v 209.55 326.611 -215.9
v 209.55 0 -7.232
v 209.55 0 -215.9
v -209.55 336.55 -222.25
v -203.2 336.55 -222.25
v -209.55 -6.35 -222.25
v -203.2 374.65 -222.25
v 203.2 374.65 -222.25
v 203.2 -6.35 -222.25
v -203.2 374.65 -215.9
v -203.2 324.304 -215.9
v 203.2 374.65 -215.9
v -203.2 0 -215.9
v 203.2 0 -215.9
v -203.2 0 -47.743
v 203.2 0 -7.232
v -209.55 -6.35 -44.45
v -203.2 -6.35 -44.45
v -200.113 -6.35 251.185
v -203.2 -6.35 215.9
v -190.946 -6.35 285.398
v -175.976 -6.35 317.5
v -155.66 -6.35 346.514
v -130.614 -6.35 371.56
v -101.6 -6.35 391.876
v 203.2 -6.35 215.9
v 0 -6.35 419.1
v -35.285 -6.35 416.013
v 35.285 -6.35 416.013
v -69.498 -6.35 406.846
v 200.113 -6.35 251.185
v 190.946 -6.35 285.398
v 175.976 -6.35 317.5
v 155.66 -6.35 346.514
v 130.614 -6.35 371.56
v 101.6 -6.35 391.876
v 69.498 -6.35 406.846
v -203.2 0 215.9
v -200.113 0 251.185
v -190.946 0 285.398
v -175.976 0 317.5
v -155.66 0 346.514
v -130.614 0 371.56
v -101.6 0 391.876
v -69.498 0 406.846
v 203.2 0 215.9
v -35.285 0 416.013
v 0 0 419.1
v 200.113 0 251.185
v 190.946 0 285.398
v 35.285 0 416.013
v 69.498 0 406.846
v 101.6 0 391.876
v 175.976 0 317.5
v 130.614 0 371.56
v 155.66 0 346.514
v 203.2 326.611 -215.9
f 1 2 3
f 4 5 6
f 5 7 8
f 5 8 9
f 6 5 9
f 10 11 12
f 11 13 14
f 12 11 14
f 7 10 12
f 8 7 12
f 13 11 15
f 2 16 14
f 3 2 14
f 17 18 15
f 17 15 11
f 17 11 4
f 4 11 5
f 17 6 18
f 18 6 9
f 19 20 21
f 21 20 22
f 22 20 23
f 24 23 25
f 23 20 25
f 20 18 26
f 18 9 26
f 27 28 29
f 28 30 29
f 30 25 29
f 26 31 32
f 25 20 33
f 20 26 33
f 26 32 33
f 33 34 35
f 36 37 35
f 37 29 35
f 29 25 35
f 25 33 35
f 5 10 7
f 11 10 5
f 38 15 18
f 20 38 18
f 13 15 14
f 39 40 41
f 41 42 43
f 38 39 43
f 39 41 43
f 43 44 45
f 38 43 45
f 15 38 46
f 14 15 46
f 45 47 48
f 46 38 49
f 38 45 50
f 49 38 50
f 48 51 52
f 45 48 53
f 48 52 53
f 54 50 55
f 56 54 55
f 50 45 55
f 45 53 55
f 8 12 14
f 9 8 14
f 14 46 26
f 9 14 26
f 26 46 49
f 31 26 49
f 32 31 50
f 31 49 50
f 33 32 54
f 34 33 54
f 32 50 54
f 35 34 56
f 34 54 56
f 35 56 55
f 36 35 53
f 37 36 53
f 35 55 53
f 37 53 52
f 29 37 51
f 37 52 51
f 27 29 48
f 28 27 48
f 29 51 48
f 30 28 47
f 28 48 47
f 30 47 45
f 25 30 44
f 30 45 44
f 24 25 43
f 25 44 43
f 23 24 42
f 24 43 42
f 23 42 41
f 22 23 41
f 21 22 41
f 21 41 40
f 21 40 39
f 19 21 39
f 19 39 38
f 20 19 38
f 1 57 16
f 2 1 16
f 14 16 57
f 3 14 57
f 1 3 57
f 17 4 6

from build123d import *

# Parameters (mm, degrees)
F1_DEPTH = 6.35
F3_W     = 406.4
F3_H     = 381
F4_DEPTH = 6.35
F7_DEPTH = 6.35
F9_DEPTH = 6.35


# Not quite as in the source:
# - a feature names something its author has since deleted; it is built from what else it names


with BuildPart() as f1:
    # F0 (on Front) → F1 (new body)
    with BuildSketch(Plane.XZ):
        with BuildLine():
            Line((-203.2, 215.9), (-203.2, -215.9))
            Line((-203.2, -215.9), (203.2, -215.9))
            Line((203.2, -215.9), (203.2, 215.9))
            ThreePointArc((203.2, 215.9), (0, 419.1), (-203.2, 215.9))
        make_face()
    extrude(amount=F1_DEPTH)

    # F3 (on offset) → F4 (join)
    with BuildSketch(Plane(origin=(0, 0, -215.9), x_dir=(1, 0, 0), z_dir=(0, 0, -1))):
        with Locations((0, -184.15)):
            Rectangle(F3_W, F3_H)
    extrude(amount=F4_DEPTH)

    # F6 (on offset) → F7 (join)
    with BuildSketch(Plane(origin=(-203.2, 0, 0), x_dir=(0, -1, 0), z_dir=(-1, 0, 0))):
        Polygon((6.35, -44.45), (-336.55, -222.25), (6.35, -222.25), align=None)
    extrude(amount=F7_DEPTH)


with BuildPart() as f9:
    # F8 (on face) → F9 (new body)
    with BuildSketch(Plane.YZ.offset(203.2)):
        Polygon((0, -215.9), (326.6108695652, -215.9), (0, -7.2319444444), align=None)
    extrude(amount=F9_DEPTH)


solid = Compound([f1.part, f9.part])
